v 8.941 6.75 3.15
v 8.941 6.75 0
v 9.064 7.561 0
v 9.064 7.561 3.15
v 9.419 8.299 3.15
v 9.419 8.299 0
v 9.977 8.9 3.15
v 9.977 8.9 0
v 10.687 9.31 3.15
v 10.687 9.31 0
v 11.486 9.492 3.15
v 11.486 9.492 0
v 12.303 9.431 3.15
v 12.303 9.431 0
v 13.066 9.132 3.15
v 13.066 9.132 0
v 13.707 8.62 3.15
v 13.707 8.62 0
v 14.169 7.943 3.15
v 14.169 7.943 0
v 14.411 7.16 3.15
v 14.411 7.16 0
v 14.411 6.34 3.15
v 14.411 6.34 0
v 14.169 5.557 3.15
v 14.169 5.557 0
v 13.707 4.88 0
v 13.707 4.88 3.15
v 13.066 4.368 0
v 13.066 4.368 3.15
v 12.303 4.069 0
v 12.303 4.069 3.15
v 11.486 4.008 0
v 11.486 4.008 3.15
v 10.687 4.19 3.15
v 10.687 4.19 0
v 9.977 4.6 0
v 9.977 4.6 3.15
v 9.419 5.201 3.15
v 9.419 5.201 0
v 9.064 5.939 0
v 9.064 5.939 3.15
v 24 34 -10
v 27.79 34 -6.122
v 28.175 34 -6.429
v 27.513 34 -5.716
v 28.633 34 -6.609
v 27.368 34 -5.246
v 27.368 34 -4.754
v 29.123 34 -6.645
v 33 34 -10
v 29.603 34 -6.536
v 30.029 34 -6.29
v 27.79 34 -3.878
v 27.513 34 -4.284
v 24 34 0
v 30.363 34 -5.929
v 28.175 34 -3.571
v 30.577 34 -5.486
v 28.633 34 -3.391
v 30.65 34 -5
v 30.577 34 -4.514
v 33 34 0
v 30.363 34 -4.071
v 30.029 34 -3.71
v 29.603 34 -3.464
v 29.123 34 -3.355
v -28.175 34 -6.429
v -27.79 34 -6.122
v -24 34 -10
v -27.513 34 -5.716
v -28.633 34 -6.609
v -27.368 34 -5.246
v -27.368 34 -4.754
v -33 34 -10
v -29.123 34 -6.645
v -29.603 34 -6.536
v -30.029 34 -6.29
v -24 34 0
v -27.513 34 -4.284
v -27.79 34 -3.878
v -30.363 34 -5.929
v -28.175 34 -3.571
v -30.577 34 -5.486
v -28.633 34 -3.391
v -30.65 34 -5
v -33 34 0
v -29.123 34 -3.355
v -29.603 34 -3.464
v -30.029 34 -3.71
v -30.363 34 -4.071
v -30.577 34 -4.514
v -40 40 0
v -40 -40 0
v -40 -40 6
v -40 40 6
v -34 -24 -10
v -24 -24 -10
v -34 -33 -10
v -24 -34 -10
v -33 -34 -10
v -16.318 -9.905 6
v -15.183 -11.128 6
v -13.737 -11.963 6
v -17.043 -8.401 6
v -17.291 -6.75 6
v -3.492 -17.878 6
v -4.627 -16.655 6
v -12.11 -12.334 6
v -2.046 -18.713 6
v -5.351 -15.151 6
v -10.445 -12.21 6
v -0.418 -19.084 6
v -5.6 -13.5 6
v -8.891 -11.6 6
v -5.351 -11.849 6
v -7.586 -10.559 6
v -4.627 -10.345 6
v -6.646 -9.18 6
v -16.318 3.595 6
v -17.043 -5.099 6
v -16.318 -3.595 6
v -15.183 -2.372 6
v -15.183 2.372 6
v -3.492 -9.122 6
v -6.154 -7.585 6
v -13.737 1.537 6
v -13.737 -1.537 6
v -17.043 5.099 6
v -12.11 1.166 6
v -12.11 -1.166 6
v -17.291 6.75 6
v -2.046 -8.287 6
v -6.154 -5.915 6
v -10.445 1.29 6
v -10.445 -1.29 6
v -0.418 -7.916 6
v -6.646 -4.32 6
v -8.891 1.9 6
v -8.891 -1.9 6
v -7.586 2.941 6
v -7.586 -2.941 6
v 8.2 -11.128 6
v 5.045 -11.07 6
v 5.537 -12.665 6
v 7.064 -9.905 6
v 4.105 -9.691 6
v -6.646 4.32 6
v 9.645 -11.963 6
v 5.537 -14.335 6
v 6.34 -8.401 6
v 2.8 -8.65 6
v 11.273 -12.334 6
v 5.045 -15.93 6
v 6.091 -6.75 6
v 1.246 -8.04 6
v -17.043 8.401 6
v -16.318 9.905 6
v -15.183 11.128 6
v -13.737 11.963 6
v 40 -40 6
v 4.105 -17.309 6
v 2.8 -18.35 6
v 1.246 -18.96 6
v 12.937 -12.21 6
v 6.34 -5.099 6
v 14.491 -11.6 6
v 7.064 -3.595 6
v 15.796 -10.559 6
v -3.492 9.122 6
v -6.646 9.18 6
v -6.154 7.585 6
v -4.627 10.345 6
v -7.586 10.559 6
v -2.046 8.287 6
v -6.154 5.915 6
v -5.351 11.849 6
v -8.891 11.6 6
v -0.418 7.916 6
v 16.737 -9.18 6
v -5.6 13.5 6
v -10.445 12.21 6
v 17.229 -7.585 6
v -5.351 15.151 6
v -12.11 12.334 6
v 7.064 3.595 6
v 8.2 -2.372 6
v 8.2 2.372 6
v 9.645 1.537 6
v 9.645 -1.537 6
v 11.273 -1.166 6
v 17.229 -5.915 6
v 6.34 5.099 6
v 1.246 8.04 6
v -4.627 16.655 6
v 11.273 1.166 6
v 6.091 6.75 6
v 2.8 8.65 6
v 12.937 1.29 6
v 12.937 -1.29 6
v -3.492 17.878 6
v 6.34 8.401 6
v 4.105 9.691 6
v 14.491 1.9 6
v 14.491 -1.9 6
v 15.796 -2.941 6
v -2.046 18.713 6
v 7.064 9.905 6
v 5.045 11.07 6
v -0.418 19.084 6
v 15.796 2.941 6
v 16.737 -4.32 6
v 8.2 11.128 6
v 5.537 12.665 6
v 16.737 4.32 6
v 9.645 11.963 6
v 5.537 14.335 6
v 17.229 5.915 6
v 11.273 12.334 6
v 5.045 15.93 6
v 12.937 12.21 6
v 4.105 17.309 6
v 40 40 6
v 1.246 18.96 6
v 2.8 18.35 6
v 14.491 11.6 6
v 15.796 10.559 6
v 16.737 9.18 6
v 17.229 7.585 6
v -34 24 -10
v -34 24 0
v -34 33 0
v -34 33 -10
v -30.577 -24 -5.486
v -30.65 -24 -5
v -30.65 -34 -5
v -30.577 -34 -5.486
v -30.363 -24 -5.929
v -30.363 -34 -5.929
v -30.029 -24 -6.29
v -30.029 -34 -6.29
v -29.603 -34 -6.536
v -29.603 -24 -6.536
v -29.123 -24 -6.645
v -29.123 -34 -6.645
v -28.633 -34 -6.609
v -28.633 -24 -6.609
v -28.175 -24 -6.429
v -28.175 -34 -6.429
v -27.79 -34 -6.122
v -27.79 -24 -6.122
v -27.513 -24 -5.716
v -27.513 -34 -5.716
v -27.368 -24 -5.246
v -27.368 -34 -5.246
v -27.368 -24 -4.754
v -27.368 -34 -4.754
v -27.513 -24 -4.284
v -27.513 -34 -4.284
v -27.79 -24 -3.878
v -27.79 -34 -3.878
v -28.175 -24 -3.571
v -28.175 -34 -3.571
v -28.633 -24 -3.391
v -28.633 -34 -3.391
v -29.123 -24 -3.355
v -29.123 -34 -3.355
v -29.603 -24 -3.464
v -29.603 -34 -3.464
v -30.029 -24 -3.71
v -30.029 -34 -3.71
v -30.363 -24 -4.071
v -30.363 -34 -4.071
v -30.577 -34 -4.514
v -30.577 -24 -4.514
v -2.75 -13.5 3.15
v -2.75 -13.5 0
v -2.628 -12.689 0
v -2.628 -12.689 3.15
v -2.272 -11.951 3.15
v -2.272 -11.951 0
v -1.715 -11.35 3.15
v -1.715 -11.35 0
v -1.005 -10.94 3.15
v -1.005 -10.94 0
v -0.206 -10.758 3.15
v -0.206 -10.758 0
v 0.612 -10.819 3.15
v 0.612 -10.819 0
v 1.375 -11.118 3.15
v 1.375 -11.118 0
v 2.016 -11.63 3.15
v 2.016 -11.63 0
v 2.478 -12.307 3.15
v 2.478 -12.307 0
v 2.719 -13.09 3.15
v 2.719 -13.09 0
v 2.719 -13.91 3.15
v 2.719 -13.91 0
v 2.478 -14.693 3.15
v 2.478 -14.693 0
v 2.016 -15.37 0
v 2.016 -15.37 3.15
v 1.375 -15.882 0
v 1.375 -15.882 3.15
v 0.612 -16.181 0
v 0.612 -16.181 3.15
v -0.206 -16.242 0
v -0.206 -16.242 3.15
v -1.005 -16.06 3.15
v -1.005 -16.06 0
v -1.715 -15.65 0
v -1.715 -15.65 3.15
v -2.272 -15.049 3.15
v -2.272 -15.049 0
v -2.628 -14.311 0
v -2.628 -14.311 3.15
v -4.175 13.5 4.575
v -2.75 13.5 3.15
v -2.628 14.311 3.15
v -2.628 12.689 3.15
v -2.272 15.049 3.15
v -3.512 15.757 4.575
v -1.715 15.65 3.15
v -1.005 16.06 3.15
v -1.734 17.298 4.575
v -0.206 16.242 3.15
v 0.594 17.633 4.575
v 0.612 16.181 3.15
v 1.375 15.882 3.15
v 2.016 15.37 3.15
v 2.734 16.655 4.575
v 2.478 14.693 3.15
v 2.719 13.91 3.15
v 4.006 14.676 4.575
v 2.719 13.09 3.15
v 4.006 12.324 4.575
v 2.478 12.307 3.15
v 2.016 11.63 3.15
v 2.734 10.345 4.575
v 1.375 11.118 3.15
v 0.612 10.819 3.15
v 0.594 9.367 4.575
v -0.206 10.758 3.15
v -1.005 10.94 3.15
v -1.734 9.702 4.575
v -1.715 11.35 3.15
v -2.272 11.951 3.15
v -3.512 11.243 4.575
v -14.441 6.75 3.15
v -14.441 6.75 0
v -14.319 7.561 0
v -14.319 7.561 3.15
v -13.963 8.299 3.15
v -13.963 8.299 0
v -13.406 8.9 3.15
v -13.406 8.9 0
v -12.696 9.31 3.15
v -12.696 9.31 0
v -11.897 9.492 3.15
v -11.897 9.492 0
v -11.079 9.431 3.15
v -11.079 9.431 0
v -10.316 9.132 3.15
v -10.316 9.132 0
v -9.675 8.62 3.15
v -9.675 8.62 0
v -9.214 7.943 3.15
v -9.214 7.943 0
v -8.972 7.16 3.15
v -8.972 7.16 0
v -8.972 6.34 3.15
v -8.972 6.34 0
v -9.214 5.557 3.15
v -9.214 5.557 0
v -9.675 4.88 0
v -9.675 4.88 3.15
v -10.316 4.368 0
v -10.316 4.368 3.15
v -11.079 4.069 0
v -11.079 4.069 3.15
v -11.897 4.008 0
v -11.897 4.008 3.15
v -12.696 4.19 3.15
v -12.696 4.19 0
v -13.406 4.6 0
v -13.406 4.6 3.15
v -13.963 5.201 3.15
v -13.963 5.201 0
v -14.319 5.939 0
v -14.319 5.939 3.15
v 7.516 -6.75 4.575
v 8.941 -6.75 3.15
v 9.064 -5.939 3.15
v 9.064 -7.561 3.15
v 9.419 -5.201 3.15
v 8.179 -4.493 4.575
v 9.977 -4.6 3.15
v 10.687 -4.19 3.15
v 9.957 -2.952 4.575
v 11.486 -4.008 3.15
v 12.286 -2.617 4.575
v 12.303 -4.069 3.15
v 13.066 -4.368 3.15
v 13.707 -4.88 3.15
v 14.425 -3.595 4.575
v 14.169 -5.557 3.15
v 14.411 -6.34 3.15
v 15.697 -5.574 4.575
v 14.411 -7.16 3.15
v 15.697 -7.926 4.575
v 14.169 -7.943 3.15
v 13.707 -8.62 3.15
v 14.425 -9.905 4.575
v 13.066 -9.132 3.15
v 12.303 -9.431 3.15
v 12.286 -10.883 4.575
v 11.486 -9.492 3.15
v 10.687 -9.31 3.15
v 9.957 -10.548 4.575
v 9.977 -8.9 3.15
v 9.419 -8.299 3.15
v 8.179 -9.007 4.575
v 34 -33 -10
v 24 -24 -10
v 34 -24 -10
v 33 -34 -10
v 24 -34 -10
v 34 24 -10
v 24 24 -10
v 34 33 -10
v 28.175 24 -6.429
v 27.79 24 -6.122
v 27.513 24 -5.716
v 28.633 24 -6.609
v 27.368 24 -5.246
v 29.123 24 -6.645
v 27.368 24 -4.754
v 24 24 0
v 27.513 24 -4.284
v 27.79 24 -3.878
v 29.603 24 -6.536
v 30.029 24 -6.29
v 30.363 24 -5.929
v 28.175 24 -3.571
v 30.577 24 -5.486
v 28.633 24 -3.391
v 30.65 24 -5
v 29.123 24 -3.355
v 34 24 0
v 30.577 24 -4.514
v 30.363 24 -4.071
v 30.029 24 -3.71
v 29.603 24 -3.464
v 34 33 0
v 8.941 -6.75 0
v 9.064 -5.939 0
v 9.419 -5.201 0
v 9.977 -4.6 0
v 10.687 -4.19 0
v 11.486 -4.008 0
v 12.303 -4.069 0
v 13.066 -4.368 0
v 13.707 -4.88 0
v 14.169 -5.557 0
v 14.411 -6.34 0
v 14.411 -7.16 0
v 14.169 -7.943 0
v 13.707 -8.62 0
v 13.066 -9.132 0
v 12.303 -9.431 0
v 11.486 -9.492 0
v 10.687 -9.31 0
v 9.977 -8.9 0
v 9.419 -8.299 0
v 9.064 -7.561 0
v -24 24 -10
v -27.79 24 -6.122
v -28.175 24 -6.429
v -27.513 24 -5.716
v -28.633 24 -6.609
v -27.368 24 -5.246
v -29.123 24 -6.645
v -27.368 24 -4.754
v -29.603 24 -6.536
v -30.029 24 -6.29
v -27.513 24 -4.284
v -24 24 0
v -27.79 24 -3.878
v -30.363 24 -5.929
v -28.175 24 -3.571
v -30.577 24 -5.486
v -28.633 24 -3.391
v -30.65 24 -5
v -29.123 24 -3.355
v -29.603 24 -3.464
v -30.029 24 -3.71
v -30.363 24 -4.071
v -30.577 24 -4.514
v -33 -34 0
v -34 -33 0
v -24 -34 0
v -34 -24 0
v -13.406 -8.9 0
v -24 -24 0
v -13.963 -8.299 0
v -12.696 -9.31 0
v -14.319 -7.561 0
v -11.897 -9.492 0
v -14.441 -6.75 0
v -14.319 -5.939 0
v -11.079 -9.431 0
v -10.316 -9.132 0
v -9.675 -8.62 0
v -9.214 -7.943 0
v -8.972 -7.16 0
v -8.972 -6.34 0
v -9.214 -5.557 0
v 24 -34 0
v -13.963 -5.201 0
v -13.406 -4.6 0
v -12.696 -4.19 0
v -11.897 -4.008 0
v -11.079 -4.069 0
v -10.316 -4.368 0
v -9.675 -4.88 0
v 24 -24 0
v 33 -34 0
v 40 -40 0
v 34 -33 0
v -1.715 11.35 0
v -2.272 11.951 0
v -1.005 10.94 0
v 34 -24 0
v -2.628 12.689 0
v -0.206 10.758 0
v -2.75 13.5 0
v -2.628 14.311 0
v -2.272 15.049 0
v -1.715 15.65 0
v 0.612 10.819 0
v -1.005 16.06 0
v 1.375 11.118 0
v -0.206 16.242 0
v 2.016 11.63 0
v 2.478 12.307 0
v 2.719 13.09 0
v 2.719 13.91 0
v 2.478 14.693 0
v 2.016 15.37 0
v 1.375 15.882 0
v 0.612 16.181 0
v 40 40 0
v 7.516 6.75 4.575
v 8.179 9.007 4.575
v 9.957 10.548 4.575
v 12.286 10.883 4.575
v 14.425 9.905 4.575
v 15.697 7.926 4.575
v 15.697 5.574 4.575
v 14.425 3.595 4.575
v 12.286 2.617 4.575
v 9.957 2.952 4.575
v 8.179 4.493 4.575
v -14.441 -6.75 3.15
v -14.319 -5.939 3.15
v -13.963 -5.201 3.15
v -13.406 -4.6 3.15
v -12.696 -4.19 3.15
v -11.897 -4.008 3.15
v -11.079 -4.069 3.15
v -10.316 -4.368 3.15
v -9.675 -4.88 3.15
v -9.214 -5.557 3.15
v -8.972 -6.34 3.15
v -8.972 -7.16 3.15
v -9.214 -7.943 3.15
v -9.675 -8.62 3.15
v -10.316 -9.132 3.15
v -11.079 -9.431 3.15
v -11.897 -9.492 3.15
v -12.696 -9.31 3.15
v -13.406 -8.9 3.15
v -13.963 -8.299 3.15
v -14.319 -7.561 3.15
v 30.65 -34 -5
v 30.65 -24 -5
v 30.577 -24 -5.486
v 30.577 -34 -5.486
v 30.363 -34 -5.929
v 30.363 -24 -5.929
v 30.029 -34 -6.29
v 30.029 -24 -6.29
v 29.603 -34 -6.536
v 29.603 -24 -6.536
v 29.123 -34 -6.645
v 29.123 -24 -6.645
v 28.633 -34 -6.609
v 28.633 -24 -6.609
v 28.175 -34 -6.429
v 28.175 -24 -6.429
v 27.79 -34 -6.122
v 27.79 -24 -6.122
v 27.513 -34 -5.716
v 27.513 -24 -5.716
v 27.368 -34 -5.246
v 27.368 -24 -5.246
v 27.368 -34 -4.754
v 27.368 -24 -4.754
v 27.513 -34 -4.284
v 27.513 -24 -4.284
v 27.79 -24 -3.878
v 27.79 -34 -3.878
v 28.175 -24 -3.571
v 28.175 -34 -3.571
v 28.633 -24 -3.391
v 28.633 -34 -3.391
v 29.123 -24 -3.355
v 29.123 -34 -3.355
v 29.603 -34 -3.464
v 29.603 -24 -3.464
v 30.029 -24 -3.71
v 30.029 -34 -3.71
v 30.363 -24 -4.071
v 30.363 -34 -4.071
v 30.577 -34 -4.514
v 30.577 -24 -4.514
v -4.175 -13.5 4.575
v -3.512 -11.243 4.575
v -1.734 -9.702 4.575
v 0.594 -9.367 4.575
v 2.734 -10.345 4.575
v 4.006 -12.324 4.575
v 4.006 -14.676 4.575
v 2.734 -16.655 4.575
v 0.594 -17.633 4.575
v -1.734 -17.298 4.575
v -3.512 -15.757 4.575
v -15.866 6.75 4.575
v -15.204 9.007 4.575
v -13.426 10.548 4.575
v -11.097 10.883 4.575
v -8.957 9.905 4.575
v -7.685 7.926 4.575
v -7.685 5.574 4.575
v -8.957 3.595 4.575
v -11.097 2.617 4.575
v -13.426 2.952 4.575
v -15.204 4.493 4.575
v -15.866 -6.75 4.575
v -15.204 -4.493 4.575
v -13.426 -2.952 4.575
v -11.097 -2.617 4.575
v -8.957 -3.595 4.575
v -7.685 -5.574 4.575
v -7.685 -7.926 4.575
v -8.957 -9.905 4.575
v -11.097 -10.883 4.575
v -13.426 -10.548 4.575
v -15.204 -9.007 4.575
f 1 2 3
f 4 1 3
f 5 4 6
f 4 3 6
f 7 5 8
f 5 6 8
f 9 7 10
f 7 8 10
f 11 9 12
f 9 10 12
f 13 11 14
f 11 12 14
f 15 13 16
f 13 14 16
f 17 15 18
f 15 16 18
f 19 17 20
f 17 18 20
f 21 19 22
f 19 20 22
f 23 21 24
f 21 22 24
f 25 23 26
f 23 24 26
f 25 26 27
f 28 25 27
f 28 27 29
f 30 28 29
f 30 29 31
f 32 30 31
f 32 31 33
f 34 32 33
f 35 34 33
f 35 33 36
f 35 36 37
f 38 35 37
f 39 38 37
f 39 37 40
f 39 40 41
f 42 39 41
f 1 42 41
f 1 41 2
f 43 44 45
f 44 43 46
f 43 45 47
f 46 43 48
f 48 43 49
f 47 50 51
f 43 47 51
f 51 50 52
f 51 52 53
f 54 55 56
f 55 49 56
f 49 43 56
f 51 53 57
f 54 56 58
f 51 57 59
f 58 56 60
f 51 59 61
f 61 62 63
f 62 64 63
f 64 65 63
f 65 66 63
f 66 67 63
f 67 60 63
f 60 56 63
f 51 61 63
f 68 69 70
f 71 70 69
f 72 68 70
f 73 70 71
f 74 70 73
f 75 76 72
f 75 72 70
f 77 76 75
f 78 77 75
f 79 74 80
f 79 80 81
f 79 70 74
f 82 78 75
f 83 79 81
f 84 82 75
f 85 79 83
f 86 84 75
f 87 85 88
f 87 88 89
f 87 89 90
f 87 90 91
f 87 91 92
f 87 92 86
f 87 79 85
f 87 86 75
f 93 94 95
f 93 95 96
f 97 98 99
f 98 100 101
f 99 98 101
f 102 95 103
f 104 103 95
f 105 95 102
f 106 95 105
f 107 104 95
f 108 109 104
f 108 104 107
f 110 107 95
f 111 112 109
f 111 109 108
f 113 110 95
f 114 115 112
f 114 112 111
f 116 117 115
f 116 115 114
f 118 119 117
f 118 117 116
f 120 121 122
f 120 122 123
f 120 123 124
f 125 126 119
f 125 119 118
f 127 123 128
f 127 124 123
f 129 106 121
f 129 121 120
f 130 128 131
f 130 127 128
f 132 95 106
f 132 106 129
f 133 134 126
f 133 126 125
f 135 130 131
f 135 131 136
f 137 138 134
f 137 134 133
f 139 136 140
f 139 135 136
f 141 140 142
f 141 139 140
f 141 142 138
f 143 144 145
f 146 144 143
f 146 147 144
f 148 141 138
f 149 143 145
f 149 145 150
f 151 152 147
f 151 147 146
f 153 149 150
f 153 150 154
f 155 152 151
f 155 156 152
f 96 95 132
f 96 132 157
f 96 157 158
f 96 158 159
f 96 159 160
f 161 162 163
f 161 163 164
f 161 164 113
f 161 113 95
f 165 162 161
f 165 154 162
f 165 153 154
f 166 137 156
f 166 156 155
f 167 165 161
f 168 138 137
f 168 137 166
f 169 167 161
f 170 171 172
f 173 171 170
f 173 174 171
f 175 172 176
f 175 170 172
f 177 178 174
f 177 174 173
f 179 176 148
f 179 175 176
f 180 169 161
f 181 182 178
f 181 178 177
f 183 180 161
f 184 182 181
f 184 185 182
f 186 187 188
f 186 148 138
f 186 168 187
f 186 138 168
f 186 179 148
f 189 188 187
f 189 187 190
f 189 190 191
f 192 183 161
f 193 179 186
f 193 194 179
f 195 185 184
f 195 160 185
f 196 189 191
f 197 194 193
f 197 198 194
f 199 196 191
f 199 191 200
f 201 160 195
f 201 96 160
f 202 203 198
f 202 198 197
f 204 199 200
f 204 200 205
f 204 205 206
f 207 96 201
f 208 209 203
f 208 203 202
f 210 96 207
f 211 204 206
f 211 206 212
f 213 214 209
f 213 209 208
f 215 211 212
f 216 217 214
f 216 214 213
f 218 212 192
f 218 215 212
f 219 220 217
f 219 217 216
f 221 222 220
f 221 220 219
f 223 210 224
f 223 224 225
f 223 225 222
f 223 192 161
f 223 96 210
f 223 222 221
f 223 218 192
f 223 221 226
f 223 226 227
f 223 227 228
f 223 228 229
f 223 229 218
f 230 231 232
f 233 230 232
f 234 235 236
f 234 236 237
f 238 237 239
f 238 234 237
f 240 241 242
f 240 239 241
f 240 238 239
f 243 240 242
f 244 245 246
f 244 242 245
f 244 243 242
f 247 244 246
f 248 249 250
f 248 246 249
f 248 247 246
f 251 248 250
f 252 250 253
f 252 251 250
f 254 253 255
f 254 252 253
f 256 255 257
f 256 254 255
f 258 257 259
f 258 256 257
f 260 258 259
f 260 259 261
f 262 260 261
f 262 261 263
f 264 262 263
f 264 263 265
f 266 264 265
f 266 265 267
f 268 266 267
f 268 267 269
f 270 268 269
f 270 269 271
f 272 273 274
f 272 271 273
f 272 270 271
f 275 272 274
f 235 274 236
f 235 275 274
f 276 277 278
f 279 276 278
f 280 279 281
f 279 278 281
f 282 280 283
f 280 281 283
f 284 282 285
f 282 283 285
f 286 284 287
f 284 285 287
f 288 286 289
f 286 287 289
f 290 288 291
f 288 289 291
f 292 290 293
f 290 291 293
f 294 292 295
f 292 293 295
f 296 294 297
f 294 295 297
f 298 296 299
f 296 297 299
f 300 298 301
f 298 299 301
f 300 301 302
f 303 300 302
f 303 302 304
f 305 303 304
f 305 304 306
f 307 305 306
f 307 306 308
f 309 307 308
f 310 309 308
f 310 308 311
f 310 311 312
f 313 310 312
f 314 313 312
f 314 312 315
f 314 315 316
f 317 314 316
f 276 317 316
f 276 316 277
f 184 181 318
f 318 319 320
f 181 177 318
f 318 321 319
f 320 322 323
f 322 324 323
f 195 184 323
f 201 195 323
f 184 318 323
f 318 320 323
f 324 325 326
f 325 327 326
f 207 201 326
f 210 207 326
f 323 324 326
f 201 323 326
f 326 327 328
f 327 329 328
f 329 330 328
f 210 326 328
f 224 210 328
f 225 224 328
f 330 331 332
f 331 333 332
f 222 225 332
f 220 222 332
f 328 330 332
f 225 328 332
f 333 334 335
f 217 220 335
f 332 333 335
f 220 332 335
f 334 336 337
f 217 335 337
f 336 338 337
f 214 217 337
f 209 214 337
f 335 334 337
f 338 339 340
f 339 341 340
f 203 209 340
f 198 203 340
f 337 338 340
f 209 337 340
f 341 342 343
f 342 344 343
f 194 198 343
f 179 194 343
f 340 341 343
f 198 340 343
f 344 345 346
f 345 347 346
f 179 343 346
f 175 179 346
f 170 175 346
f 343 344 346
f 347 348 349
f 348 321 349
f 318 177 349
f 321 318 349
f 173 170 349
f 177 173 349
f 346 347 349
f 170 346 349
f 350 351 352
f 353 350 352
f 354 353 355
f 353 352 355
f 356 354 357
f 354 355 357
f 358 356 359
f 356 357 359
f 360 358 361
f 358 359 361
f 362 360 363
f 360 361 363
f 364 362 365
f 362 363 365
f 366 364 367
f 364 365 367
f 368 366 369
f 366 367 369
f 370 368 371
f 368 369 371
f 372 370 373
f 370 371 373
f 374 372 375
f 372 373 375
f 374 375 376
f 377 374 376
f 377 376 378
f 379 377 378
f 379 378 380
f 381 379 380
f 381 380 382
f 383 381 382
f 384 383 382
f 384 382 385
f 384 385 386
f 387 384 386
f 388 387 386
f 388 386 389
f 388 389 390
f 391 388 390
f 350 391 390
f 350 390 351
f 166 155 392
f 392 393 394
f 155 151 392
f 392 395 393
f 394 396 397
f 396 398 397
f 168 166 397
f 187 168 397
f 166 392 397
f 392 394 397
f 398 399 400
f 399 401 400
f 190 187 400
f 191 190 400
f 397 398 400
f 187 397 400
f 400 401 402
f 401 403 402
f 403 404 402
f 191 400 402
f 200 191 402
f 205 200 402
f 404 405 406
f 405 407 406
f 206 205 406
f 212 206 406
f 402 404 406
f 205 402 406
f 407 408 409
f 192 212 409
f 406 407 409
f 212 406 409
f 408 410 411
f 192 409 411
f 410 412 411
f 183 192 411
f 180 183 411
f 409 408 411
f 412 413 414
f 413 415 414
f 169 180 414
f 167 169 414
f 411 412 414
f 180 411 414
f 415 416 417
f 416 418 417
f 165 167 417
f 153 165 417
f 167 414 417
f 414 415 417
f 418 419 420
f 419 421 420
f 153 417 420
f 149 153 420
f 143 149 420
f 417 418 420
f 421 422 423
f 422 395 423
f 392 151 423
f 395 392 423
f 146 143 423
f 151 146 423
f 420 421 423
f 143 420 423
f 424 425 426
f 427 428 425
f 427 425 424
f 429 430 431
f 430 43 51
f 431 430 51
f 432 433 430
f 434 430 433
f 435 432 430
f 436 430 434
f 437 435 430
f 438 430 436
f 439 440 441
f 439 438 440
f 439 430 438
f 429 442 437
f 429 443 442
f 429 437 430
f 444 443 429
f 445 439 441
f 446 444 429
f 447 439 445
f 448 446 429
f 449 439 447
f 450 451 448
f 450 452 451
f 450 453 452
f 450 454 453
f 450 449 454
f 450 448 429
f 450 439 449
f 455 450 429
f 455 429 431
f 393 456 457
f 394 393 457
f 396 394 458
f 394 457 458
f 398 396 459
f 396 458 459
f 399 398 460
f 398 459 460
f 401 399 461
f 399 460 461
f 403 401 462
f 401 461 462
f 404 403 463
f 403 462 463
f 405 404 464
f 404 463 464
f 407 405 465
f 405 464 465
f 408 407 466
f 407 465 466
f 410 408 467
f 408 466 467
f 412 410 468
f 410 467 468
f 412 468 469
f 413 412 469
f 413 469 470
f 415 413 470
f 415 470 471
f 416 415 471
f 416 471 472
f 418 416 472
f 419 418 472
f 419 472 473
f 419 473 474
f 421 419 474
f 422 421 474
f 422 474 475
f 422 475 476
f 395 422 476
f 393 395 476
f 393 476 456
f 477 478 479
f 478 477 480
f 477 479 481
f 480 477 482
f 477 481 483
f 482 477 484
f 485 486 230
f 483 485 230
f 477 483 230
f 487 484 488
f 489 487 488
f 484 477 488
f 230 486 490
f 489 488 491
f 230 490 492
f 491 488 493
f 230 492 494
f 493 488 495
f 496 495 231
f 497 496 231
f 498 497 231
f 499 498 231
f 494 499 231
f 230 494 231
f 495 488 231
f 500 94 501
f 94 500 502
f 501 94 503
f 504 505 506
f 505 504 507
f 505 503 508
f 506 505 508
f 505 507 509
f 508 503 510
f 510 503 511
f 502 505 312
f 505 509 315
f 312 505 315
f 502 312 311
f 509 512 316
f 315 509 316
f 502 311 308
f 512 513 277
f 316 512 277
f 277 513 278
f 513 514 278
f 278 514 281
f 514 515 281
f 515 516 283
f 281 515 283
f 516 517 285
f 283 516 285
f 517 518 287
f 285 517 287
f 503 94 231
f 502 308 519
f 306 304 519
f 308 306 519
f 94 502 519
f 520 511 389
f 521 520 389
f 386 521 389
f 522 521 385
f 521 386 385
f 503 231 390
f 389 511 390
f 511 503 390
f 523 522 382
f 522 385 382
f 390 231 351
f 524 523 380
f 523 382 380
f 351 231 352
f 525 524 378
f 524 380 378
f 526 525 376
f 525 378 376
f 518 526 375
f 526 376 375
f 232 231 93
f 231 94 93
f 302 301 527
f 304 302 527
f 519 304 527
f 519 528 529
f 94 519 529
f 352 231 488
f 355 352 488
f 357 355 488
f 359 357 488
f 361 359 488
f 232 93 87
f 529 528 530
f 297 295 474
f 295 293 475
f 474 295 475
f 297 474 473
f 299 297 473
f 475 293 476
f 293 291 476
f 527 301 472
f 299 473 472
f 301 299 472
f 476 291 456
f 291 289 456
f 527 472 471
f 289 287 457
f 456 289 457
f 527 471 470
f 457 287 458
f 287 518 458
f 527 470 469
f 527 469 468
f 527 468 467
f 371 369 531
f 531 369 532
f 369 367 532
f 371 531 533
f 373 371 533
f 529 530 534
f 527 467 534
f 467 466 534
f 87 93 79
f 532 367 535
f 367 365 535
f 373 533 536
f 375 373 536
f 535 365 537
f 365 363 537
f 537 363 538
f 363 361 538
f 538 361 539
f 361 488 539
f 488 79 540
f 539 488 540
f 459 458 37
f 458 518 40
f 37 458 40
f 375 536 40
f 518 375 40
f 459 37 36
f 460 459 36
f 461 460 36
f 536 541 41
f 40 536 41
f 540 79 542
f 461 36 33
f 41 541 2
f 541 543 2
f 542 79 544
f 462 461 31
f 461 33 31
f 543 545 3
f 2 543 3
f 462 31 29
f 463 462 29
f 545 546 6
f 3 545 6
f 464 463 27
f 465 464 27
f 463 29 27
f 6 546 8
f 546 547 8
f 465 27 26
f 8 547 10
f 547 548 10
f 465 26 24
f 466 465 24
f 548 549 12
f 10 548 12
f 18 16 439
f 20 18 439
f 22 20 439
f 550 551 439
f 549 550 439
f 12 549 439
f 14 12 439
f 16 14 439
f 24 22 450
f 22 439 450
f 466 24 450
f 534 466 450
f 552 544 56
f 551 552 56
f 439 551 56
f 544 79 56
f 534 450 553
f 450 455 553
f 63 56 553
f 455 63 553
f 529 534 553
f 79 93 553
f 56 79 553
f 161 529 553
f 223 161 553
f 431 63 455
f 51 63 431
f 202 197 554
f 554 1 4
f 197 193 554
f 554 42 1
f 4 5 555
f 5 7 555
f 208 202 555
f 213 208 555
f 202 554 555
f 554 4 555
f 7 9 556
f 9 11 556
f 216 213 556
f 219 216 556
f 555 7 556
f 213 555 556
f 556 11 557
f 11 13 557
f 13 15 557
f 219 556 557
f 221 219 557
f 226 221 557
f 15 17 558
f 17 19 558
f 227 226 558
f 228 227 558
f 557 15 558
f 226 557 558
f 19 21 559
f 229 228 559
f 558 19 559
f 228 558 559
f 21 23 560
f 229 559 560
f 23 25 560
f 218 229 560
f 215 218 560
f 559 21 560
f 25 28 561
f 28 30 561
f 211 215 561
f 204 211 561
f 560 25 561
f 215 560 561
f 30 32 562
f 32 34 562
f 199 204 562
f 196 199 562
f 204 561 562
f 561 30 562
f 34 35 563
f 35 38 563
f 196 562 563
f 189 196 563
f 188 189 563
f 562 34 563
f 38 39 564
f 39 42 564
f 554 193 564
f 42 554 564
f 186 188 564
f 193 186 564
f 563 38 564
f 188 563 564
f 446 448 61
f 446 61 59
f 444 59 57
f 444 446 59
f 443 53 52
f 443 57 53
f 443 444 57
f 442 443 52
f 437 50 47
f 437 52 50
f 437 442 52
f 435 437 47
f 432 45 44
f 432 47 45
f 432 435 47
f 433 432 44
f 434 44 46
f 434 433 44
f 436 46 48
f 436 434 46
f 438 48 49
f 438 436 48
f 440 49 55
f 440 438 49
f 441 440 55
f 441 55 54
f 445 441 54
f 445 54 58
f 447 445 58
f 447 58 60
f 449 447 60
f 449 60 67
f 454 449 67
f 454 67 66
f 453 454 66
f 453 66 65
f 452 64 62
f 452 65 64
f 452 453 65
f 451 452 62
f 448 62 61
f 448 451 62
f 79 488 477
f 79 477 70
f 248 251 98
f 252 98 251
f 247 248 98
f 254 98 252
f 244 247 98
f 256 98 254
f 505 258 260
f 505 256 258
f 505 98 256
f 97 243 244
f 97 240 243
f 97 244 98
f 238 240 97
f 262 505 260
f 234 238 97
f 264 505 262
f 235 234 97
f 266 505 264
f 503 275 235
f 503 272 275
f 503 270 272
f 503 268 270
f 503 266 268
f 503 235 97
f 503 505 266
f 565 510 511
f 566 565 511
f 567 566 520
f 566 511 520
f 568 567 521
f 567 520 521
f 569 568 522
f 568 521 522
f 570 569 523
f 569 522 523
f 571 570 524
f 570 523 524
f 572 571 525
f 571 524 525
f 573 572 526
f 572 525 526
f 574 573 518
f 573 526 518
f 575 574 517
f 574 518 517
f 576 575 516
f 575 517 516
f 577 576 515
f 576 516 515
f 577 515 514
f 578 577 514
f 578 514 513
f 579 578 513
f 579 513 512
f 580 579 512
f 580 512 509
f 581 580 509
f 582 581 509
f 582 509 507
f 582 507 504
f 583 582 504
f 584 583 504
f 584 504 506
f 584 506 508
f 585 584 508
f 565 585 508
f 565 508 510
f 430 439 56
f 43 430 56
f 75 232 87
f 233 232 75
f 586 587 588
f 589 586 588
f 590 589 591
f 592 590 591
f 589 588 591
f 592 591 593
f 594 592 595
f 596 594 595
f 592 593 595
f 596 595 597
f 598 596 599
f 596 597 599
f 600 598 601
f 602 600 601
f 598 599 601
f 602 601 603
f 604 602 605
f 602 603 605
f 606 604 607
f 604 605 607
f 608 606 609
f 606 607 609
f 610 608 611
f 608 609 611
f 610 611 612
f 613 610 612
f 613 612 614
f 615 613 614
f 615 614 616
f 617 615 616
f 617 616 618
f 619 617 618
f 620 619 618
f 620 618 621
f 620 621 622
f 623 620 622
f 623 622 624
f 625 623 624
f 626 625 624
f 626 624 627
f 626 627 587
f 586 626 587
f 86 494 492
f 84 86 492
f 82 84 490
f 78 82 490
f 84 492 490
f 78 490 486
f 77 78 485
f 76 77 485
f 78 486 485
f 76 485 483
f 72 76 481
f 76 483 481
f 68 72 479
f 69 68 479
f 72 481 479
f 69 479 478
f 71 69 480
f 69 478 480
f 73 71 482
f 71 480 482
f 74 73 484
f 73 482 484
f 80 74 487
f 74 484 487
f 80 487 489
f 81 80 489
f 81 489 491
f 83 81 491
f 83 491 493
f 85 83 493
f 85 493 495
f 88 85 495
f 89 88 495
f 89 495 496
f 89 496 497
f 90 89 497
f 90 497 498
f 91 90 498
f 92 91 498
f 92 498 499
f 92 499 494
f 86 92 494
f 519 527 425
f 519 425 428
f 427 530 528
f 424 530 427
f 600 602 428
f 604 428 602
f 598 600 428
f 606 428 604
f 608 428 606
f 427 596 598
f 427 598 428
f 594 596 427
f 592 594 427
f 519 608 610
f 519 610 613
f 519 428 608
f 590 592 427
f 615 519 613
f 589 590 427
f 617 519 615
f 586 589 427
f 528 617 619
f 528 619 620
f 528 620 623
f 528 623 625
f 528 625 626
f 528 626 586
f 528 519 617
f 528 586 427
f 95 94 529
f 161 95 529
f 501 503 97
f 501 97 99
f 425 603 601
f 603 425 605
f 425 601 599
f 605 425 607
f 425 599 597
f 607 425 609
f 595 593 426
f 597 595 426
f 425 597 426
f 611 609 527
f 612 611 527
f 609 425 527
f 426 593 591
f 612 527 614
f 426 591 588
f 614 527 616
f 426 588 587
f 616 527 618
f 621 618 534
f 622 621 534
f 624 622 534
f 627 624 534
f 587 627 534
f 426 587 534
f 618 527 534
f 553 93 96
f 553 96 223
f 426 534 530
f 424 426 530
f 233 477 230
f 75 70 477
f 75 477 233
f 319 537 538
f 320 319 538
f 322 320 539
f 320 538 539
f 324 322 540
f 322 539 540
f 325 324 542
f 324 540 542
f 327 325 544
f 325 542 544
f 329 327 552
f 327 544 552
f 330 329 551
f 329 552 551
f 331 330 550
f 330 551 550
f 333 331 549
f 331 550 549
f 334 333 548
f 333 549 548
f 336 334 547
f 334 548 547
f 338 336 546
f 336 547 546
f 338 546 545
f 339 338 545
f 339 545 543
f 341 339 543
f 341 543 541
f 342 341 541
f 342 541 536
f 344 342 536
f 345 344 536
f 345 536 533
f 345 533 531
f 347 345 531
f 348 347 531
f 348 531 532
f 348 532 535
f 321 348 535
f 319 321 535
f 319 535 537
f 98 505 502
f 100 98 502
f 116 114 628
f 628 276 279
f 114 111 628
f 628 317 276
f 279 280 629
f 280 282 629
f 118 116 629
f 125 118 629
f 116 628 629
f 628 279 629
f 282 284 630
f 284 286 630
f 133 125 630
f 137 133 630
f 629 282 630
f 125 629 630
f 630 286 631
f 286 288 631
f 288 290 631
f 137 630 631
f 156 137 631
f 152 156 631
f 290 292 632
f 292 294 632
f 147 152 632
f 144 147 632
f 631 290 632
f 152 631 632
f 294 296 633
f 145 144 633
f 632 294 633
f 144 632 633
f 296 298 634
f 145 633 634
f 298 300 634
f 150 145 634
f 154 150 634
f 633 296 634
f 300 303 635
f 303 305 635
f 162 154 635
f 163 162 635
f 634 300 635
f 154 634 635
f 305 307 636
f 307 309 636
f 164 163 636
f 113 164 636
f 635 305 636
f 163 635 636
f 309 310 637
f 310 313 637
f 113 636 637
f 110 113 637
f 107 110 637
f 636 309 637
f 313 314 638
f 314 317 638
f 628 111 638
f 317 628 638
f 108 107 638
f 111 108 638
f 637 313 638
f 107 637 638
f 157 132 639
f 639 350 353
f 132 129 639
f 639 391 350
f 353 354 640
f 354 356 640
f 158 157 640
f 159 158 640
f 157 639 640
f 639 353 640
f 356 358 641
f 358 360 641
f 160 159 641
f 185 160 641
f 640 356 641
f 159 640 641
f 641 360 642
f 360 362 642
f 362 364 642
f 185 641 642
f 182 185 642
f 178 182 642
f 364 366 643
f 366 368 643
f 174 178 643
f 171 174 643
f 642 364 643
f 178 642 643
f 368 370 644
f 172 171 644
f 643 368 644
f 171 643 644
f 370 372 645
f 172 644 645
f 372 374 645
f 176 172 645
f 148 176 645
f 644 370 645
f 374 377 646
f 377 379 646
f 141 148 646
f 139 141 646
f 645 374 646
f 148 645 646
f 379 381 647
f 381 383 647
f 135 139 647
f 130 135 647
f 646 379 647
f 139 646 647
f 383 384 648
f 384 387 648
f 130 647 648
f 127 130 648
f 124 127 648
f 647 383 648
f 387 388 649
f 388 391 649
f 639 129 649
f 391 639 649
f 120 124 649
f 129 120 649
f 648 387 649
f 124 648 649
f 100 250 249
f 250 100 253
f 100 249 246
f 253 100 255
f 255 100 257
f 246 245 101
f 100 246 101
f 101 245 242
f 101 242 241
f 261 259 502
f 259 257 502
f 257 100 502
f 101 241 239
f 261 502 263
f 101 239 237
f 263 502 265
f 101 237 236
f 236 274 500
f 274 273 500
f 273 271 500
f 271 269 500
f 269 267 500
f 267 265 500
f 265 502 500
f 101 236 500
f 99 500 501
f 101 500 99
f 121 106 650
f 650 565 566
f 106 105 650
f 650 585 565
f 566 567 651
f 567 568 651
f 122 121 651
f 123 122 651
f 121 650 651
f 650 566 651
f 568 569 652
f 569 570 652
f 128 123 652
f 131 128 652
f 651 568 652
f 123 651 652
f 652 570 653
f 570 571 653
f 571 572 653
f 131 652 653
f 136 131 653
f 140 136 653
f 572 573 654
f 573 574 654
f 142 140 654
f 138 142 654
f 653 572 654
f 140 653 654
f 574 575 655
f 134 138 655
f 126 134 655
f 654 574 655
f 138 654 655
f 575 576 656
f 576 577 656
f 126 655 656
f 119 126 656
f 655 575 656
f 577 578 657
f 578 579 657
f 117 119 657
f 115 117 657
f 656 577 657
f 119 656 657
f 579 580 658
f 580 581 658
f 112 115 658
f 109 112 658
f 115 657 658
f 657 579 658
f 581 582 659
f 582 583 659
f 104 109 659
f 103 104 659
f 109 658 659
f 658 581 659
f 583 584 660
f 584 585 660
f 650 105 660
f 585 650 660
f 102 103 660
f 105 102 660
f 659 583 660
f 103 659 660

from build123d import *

# Parameters (mm, degrees)
SKETCH_1_W                   = 80
SKETCH_1_H                   = 80
EXTRUDE_1_DEPTH              = 6
SKETCH_11_W                  = 10
SKETCH_11_H                  = 10
EXTRUDE_3_DEPTH              = 10
HOLE_WIZARD_M4_2_D           = 3.3
HOLE_WIZARD_M4_2_DEPTH       = 68
HOLE_WIZARD_M5_1_D           = 5.5
HOLE_WIZARD_M5_1_DEPTH       = 6
HOLE_WIZARD_M5_1_CSINK_D     = 11.2
HOLE_WIZARD_M5_1_CSINK_ANGLE = 90
MIRROR_2_COPY_1_SKETCH_W     = 10
MIRROR_2_COPY_1_SKETCH_H     = 10
MIRROR_2_COPY_1_DEPTH        = 10
MIRROR_2_COPY_2_D            = 3.3
MIRROR_2_COPY_2_DEPTH        = 68
CHAMFER_1_SIZE               = 1


with BuildPart() as part:
    # 스케치1 → 보스-돌출1 (new body)
    with BuildSketch(Plane.XY):
        Rectangle(SKETCH_1_W, SKETCH_1_H)
    extrude(amount=EXTRUDE_1_DEPTH)

    # 스케치11 → 보스-돌출3 (add)
    with BuildSketch(Plane(origin=(0, 0, 0), x_dir=(-1, 0, 0), z_dir=(0, 0, -1))):
        with Locations((29, 29)):
            Rectangle(SKETCH_11_W, SKETCH_11_H)
    extrude_3 = extrude(amount=EXTRUDE_3_DEPTH)

    # M4 나사 구멍2
    with Locations(Plane(origin=(0, 34, 0), x_dir=(1, 0, 0), z_dir=(0, 1, 0))):
        with Locations((-29, 5)):
            hole_wizard_m4_2 = Hole(HOLE_WIZARD_M4_2_D / 2, depth=HOLE_WIZARD_M4_2_DEPTH)

    # M5 육각 소켓 접시 머리 캡 나사용 카운터싱크1
    with Locations(Plane.XY.offset(6)):
        with Locations((-11.691342951, -6.75), (0, -13.5), (11.691342951, -6.75), (11.691342951, 6.75), (0, 13.5), (-11.691342951, 6.75)):
            CounterSinkHole(HOLE_WIZARD_M5_1_D / 2, HOLE_WIZARD_M5_1_CSINK_D / 2, depth=HOLE_WIZARD_M5_1_DEPTH, counter_sink_angle=HOLE_WIZARD_M5_1_CSINK_ANGLE)

    # 대칭 복사1: 보스-돌출3, M4 나사 구멍2 across plane
    add(extrude_3.mirror(Plane(origin=(0, 0, 0), x_dir=(0, 0, 1), z_dir=(1, 0, 0))))
    add(hole_wizard_m4_2.mirror(Plane(origin=(0, 0, 0), x_dir=(0, 0, 1), z_dir=(1, 0, 0))), mode=Mode.SUBTRACT)

    # 대칭 복사2: 보스-돌출3, M4 나사 구멍2 across plane
    add(extrude_3.mirror(Plane.ZX))
    add(hole_wizard_m4_2.mirror(Plane.ZX), mode=Mode.SUBTRACT)

    # 대칭 복사2 copy 1 sketch → 대칭 복사2 copy 1 (add)
    with BuildSketch(Plane(origin=(0, 0, 0), x_dir=(1, 0, 0), z_dir=(0, 0, -1))):
        with Locations((29, 29)):
            Rectangle(MIRROR_2_COPY_1_SKETCH_W, MIRROR_2_COPY_1_SKETCH_H)
    extrude(amount=MIRROR_2_COPY_1_DEPTH)

    # 대칭 복사2 copy 2
    with Locations(Plane(origin=(0, -34, 0), x_dir=(-1, 0, 0), z_dir=(0, -1, 0))):
        with Locations((-29, 5)):
            Hole(MIRROR_2_COPY_2_D / 2, depth=MIRROR_2_COPY_2_DEPTH)

    # 모따기1
    chamfer_1_edges = [part.edges().sort_by_distance(p)[0] for p in [
        (34, -34, -5),
        (-34, -34, -5),
        (-34, 34, -5),
        (34, 34, -5),
    ]]
    chamfer(chamfer_1_edges, length=CHAMFER_1_SIZE)


solid = part.part
